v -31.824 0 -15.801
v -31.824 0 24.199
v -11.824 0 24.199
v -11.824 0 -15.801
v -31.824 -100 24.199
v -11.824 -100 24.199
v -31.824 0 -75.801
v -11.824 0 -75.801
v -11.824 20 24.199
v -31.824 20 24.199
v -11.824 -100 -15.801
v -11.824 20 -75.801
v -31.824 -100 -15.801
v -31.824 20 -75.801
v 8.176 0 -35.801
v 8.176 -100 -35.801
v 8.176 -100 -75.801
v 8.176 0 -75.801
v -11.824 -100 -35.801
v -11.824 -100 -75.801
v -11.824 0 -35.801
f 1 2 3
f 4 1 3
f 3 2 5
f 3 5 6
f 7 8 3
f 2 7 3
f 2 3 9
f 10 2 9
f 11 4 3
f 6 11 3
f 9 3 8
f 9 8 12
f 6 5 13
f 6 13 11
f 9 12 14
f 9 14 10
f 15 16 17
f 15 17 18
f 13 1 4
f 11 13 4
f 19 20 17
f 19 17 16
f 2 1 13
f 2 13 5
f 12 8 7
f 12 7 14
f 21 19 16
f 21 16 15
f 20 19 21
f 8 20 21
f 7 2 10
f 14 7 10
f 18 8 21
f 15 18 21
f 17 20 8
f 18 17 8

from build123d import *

# Parameters (mm, degrees)
F0_W     = 20
F0_H     = 40
F1_DEPTH = 100
F2_W     = 20
F2_H     = 100
F3_DEPTH = 20
F4_W     = 100
F4_H     = 40
F5_DEPTH = 20


with BuildPart() as f1:
    # F0 (on Front) → F1 (new body)
    with BuildSketch(Plane.XZ):
        with Locations((-21.823531, 4.198755)):
            Rectangle(F0_W, F0_H)
    extrude(amount=F1_DEPTH)


with BuildPart() as f3:
    # F2 (on face) → F3 (new body)
    with BuildSketch(Plane.YZ.offset(-11.823531)):
        with Locations((10, -25.801245)):
            Rectangle(F2_W, F2_H)
    extrude(amount=-F3_DEPTH)


with BuildPart() as f5:
    # F4 (on face) → F5 (new body)
    with BuildSketch(Plane.YZ.offset(-11.823531)):
        with Locations((-50, -55.801245)):
            Rectangle(F4_W, F4_H)
    extrude(amount=F5_DEPTH)


solid = Compound([f1.part, f3.part, f5.part])
